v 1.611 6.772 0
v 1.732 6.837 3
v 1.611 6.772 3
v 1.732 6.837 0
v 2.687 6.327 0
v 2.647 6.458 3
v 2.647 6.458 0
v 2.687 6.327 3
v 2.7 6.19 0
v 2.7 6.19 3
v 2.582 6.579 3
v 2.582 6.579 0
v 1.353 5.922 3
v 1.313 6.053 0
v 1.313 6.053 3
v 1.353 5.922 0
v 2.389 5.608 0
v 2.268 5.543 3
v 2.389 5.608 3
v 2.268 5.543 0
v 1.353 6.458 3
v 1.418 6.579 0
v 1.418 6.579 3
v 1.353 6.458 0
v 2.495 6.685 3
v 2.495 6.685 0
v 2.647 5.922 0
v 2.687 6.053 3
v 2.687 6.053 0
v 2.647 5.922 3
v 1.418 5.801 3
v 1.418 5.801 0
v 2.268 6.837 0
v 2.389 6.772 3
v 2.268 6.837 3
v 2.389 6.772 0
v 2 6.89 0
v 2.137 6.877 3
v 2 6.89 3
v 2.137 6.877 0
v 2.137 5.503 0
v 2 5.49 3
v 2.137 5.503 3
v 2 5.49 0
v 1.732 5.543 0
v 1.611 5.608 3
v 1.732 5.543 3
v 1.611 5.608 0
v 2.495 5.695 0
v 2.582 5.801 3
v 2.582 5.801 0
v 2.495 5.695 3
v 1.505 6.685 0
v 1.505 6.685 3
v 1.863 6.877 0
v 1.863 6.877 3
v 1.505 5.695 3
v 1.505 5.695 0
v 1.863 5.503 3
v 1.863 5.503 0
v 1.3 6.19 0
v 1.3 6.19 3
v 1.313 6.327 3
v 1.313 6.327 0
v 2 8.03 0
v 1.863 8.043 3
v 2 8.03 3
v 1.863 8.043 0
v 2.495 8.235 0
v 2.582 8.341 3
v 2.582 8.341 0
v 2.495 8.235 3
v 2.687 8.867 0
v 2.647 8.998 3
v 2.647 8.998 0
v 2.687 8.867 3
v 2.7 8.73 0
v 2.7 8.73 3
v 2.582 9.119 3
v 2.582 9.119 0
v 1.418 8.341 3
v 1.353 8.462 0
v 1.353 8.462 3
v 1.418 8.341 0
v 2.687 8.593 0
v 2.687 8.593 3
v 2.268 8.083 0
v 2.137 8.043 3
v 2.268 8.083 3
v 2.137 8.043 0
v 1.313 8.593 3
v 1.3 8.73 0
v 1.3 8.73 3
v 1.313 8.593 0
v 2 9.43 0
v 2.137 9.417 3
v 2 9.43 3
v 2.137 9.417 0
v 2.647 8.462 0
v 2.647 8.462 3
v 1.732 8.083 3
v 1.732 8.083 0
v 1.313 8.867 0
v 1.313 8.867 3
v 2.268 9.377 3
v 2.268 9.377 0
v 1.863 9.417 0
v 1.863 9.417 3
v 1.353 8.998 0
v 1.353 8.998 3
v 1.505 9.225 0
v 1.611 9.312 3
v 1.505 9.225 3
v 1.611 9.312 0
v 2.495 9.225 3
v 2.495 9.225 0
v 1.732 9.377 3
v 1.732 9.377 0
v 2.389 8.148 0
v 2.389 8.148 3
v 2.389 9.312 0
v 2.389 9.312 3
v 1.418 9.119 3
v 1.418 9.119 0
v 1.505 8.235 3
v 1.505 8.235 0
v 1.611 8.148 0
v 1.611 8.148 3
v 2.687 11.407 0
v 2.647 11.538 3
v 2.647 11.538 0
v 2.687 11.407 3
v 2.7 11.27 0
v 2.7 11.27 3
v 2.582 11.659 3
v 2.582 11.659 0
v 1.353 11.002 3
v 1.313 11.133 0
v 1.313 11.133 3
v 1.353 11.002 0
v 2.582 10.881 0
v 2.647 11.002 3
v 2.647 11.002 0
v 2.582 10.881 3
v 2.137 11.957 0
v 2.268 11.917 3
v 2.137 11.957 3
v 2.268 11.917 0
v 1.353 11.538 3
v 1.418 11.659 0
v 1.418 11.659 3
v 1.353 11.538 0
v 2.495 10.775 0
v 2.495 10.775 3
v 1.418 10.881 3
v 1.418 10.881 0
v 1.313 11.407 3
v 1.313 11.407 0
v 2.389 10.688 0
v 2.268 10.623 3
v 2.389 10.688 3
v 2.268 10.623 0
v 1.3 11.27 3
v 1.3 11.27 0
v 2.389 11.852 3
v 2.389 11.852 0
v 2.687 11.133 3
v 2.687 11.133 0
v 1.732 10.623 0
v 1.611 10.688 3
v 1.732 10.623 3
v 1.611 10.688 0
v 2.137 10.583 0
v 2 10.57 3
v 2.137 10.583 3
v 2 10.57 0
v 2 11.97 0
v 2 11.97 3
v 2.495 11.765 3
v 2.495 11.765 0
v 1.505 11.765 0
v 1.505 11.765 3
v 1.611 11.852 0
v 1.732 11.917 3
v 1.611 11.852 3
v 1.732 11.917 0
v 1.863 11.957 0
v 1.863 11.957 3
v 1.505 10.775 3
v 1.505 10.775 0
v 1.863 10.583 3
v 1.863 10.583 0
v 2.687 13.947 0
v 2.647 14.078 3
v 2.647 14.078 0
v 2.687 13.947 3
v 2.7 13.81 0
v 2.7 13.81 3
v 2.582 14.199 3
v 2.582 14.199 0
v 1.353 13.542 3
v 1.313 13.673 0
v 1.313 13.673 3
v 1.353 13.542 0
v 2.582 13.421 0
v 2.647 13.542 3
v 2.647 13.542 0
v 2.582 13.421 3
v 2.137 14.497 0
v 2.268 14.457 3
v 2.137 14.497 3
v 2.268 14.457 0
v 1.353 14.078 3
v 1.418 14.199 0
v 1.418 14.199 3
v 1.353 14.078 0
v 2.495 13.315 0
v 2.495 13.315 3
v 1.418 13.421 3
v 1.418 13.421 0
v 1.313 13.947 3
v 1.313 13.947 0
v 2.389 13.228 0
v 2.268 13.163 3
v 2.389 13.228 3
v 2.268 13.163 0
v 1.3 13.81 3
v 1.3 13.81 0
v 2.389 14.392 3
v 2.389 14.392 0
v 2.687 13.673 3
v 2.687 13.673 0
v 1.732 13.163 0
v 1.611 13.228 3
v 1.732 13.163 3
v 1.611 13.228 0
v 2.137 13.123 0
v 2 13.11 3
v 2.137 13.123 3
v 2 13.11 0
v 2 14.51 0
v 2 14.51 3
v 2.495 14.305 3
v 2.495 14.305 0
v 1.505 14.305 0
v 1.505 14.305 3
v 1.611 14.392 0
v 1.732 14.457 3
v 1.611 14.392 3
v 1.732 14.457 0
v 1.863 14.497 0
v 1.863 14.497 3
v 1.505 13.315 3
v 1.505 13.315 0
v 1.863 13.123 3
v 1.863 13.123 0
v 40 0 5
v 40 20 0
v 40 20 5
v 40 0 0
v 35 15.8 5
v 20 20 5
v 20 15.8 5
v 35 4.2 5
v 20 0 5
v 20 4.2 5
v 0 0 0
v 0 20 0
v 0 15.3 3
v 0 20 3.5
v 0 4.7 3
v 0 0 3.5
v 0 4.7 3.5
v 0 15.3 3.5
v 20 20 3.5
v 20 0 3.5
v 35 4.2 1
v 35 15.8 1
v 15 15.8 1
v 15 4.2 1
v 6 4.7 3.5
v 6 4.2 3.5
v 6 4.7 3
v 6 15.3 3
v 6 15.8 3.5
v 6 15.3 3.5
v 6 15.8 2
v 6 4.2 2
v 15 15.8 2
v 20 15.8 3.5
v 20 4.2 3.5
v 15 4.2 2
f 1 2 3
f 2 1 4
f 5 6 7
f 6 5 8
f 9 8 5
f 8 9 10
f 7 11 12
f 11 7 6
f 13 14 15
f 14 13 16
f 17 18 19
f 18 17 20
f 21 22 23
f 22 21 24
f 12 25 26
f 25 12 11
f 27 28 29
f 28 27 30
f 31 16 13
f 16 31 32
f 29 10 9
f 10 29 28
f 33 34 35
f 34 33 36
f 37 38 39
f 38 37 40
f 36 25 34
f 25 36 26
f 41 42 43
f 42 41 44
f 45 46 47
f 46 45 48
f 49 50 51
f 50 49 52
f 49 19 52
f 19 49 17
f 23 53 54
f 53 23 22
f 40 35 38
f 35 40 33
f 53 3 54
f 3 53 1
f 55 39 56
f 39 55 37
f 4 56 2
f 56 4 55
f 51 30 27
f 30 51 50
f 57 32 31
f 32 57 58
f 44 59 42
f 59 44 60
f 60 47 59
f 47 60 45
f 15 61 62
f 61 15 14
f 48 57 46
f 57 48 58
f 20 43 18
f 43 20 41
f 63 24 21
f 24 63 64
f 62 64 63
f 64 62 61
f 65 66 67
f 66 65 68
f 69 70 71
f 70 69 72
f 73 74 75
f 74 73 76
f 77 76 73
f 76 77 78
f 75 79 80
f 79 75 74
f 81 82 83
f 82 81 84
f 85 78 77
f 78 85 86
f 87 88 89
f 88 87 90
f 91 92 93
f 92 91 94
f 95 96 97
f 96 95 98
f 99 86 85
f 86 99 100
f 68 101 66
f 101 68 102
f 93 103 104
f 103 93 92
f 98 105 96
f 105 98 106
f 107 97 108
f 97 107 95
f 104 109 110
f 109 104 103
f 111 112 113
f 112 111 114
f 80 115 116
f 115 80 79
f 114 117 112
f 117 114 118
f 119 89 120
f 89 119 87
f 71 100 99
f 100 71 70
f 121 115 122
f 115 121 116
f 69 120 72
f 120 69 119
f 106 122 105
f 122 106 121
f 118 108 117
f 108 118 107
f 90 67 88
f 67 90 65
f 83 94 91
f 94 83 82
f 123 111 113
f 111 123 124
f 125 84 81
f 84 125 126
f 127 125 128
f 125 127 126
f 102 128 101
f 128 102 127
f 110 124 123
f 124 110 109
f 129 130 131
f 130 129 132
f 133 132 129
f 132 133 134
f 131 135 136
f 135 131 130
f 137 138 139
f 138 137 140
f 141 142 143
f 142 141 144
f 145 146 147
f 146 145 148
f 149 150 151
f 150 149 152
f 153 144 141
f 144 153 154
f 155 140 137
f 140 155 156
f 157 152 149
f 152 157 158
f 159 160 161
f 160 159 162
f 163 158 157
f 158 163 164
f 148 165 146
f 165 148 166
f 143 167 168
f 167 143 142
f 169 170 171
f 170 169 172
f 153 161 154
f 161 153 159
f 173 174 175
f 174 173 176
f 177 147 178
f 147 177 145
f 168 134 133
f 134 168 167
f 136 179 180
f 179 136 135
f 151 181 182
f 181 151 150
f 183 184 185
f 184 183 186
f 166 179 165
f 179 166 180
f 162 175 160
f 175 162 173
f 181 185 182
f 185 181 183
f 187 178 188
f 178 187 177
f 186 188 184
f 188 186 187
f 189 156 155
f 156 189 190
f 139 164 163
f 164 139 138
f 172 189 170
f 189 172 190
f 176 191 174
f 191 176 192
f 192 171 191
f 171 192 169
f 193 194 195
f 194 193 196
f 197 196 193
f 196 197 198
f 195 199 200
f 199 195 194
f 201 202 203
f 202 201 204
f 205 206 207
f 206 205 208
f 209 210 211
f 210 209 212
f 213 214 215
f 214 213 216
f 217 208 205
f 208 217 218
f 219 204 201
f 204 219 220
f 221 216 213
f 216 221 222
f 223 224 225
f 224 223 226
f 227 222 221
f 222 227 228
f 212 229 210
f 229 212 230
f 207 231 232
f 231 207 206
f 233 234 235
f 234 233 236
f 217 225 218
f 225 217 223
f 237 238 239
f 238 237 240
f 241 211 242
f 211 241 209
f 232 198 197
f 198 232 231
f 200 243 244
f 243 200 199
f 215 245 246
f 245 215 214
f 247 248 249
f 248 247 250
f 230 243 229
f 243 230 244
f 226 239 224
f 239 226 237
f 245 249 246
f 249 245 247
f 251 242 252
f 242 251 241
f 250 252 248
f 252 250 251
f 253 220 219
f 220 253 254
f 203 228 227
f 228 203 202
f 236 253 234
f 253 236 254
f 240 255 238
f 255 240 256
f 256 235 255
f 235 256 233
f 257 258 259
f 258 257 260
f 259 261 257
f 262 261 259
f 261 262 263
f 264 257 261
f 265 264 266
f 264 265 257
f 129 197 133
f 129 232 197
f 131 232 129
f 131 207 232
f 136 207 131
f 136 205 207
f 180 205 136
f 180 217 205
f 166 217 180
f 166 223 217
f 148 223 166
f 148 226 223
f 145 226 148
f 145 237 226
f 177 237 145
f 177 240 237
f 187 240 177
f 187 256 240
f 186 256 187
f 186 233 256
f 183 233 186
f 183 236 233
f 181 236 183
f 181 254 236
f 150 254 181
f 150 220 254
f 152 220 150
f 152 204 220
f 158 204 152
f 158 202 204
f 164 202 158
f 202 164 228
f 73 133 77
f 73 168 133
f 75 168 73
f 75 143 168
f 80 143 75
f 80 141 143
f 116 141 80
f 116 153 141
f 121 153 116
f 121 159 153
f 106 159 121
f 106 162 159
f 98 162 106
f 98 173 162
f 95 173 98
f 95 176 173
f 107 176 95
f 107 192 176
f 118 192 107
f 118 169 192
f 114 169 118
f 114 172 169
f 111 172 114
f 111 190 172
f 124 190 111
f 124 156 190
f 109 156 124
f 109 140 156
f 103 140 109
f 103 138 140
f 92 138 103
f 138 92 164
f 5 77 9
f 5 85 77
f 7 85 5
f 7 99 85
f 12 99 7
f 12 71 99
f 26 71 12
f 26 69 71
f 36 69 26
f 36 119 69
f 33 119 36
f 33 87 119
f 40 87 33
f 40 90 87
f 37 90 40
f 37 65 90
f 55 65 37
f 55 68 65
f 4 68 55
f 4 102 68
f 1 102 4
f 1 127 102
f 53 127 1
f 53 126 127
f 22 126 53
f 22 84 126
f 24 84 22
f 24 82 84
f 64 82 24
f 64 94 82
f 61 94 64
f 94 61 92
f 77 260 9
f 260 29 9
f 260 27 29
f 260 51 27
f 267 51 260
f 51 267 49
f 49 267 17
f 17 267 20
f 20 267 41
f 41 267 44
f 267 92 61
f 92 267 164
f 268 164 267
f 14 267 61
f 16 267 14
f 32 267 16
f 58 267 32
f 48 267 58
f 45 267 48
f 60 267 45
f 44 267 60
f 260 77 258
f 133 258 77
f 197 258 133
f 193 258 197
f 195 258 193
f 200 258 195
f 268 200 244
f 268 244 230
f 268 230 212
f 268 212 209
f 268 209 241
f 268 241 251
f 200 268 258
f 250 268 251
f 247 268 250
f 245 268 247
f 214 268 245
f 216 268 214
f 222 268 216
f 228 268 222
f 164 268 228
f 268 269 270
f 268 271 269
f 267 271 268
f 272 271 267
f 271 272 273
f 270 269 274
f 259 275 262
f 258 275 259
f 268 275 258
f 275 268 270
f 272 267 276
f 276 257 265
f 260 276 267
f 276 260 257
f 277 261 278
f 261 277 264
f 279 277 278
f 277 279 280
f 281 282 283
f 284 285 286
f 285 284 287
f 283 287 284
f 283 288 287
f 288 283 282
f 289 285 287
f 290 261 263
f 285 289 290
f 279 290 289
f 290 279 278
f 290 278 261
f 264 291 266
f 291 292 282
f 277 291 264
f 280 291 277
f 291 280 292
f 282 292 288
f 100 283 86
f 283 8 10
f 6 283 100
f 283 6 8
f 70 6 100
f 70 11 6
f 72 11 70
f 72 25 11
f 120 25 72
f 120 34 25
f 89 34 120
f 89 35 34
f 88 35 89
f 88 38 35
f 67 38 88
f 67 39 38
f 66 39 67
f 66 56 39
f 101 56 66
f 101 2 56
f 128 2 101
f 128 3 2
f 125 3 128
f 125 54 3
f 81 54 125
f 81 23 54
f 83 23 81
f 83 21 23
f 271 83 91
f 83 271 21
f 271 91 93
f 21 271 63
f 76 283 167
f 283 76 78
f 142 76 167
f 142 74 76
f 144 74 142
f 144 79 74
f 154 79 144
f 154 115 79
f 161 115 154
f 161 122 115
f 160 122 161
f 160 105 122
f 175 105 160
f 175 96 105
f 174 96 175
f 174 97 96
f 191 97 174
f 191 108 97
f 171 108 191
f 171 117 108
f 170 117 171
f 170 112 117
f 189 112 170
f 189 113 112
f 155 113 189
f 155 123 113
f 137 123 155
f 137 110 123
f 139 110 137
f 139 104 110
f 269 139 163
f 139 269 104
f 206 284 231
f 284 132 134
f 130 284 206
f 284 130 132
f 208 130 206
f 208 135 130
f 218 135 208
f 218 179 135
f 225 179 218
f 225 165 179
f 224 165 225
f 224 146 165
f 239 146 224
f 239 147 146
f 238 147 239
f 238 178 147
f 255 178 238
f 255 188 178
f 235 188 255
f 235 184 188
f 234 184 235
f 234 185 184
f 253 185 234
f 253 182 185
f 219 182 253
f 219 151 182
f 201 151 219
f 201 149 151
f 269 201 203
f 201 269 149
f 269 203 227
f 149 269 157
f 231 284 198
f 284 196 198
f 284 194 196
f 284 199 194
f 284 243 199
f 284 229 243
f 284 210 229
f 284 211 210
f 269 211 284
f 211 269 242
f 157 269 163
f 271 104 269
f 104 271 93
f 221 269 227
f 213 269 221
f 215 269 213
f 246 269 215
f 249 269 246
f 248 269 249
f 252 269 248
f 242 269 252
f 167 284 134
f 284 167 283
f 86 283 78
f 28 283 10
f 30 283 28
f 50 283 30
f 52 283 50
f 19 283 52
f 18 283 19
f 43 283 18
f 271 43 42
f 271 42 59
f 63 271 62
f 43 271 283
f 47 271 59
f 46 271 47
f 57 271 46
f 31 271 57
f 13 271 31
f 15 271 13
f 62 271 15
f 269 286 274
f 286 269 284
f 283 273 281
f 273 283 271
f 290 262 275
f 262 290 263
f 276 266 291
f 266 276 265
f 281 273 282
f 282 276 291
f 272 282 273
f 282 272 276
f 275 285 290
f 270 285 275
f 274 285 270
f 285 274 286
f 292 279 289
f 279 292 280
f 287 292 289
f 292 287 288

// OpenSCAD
$fn=32;
  
hole_radius = 0.7;
pitch = 2.54;

union() {
difference() {
  cube([40,20,5]);
    
  translate([6,4.2, 1])
  cube([29,11.6,10]);
    
  translate([0,4.7, 3])
  cube([6,10.6,10]);
    
  translate([0,-1, 3.5])
  cube([20,30,10]);
  
  translate([2,10 - pitch*3/2,0])
  union() {
    for (i=[0:3]) {
      translate([0, pitch*i, -1])
      cylinder(h=5, r=hole_radius);
    }
  }
}

translate([5,0,0])
cube([10,20,2]);
}
